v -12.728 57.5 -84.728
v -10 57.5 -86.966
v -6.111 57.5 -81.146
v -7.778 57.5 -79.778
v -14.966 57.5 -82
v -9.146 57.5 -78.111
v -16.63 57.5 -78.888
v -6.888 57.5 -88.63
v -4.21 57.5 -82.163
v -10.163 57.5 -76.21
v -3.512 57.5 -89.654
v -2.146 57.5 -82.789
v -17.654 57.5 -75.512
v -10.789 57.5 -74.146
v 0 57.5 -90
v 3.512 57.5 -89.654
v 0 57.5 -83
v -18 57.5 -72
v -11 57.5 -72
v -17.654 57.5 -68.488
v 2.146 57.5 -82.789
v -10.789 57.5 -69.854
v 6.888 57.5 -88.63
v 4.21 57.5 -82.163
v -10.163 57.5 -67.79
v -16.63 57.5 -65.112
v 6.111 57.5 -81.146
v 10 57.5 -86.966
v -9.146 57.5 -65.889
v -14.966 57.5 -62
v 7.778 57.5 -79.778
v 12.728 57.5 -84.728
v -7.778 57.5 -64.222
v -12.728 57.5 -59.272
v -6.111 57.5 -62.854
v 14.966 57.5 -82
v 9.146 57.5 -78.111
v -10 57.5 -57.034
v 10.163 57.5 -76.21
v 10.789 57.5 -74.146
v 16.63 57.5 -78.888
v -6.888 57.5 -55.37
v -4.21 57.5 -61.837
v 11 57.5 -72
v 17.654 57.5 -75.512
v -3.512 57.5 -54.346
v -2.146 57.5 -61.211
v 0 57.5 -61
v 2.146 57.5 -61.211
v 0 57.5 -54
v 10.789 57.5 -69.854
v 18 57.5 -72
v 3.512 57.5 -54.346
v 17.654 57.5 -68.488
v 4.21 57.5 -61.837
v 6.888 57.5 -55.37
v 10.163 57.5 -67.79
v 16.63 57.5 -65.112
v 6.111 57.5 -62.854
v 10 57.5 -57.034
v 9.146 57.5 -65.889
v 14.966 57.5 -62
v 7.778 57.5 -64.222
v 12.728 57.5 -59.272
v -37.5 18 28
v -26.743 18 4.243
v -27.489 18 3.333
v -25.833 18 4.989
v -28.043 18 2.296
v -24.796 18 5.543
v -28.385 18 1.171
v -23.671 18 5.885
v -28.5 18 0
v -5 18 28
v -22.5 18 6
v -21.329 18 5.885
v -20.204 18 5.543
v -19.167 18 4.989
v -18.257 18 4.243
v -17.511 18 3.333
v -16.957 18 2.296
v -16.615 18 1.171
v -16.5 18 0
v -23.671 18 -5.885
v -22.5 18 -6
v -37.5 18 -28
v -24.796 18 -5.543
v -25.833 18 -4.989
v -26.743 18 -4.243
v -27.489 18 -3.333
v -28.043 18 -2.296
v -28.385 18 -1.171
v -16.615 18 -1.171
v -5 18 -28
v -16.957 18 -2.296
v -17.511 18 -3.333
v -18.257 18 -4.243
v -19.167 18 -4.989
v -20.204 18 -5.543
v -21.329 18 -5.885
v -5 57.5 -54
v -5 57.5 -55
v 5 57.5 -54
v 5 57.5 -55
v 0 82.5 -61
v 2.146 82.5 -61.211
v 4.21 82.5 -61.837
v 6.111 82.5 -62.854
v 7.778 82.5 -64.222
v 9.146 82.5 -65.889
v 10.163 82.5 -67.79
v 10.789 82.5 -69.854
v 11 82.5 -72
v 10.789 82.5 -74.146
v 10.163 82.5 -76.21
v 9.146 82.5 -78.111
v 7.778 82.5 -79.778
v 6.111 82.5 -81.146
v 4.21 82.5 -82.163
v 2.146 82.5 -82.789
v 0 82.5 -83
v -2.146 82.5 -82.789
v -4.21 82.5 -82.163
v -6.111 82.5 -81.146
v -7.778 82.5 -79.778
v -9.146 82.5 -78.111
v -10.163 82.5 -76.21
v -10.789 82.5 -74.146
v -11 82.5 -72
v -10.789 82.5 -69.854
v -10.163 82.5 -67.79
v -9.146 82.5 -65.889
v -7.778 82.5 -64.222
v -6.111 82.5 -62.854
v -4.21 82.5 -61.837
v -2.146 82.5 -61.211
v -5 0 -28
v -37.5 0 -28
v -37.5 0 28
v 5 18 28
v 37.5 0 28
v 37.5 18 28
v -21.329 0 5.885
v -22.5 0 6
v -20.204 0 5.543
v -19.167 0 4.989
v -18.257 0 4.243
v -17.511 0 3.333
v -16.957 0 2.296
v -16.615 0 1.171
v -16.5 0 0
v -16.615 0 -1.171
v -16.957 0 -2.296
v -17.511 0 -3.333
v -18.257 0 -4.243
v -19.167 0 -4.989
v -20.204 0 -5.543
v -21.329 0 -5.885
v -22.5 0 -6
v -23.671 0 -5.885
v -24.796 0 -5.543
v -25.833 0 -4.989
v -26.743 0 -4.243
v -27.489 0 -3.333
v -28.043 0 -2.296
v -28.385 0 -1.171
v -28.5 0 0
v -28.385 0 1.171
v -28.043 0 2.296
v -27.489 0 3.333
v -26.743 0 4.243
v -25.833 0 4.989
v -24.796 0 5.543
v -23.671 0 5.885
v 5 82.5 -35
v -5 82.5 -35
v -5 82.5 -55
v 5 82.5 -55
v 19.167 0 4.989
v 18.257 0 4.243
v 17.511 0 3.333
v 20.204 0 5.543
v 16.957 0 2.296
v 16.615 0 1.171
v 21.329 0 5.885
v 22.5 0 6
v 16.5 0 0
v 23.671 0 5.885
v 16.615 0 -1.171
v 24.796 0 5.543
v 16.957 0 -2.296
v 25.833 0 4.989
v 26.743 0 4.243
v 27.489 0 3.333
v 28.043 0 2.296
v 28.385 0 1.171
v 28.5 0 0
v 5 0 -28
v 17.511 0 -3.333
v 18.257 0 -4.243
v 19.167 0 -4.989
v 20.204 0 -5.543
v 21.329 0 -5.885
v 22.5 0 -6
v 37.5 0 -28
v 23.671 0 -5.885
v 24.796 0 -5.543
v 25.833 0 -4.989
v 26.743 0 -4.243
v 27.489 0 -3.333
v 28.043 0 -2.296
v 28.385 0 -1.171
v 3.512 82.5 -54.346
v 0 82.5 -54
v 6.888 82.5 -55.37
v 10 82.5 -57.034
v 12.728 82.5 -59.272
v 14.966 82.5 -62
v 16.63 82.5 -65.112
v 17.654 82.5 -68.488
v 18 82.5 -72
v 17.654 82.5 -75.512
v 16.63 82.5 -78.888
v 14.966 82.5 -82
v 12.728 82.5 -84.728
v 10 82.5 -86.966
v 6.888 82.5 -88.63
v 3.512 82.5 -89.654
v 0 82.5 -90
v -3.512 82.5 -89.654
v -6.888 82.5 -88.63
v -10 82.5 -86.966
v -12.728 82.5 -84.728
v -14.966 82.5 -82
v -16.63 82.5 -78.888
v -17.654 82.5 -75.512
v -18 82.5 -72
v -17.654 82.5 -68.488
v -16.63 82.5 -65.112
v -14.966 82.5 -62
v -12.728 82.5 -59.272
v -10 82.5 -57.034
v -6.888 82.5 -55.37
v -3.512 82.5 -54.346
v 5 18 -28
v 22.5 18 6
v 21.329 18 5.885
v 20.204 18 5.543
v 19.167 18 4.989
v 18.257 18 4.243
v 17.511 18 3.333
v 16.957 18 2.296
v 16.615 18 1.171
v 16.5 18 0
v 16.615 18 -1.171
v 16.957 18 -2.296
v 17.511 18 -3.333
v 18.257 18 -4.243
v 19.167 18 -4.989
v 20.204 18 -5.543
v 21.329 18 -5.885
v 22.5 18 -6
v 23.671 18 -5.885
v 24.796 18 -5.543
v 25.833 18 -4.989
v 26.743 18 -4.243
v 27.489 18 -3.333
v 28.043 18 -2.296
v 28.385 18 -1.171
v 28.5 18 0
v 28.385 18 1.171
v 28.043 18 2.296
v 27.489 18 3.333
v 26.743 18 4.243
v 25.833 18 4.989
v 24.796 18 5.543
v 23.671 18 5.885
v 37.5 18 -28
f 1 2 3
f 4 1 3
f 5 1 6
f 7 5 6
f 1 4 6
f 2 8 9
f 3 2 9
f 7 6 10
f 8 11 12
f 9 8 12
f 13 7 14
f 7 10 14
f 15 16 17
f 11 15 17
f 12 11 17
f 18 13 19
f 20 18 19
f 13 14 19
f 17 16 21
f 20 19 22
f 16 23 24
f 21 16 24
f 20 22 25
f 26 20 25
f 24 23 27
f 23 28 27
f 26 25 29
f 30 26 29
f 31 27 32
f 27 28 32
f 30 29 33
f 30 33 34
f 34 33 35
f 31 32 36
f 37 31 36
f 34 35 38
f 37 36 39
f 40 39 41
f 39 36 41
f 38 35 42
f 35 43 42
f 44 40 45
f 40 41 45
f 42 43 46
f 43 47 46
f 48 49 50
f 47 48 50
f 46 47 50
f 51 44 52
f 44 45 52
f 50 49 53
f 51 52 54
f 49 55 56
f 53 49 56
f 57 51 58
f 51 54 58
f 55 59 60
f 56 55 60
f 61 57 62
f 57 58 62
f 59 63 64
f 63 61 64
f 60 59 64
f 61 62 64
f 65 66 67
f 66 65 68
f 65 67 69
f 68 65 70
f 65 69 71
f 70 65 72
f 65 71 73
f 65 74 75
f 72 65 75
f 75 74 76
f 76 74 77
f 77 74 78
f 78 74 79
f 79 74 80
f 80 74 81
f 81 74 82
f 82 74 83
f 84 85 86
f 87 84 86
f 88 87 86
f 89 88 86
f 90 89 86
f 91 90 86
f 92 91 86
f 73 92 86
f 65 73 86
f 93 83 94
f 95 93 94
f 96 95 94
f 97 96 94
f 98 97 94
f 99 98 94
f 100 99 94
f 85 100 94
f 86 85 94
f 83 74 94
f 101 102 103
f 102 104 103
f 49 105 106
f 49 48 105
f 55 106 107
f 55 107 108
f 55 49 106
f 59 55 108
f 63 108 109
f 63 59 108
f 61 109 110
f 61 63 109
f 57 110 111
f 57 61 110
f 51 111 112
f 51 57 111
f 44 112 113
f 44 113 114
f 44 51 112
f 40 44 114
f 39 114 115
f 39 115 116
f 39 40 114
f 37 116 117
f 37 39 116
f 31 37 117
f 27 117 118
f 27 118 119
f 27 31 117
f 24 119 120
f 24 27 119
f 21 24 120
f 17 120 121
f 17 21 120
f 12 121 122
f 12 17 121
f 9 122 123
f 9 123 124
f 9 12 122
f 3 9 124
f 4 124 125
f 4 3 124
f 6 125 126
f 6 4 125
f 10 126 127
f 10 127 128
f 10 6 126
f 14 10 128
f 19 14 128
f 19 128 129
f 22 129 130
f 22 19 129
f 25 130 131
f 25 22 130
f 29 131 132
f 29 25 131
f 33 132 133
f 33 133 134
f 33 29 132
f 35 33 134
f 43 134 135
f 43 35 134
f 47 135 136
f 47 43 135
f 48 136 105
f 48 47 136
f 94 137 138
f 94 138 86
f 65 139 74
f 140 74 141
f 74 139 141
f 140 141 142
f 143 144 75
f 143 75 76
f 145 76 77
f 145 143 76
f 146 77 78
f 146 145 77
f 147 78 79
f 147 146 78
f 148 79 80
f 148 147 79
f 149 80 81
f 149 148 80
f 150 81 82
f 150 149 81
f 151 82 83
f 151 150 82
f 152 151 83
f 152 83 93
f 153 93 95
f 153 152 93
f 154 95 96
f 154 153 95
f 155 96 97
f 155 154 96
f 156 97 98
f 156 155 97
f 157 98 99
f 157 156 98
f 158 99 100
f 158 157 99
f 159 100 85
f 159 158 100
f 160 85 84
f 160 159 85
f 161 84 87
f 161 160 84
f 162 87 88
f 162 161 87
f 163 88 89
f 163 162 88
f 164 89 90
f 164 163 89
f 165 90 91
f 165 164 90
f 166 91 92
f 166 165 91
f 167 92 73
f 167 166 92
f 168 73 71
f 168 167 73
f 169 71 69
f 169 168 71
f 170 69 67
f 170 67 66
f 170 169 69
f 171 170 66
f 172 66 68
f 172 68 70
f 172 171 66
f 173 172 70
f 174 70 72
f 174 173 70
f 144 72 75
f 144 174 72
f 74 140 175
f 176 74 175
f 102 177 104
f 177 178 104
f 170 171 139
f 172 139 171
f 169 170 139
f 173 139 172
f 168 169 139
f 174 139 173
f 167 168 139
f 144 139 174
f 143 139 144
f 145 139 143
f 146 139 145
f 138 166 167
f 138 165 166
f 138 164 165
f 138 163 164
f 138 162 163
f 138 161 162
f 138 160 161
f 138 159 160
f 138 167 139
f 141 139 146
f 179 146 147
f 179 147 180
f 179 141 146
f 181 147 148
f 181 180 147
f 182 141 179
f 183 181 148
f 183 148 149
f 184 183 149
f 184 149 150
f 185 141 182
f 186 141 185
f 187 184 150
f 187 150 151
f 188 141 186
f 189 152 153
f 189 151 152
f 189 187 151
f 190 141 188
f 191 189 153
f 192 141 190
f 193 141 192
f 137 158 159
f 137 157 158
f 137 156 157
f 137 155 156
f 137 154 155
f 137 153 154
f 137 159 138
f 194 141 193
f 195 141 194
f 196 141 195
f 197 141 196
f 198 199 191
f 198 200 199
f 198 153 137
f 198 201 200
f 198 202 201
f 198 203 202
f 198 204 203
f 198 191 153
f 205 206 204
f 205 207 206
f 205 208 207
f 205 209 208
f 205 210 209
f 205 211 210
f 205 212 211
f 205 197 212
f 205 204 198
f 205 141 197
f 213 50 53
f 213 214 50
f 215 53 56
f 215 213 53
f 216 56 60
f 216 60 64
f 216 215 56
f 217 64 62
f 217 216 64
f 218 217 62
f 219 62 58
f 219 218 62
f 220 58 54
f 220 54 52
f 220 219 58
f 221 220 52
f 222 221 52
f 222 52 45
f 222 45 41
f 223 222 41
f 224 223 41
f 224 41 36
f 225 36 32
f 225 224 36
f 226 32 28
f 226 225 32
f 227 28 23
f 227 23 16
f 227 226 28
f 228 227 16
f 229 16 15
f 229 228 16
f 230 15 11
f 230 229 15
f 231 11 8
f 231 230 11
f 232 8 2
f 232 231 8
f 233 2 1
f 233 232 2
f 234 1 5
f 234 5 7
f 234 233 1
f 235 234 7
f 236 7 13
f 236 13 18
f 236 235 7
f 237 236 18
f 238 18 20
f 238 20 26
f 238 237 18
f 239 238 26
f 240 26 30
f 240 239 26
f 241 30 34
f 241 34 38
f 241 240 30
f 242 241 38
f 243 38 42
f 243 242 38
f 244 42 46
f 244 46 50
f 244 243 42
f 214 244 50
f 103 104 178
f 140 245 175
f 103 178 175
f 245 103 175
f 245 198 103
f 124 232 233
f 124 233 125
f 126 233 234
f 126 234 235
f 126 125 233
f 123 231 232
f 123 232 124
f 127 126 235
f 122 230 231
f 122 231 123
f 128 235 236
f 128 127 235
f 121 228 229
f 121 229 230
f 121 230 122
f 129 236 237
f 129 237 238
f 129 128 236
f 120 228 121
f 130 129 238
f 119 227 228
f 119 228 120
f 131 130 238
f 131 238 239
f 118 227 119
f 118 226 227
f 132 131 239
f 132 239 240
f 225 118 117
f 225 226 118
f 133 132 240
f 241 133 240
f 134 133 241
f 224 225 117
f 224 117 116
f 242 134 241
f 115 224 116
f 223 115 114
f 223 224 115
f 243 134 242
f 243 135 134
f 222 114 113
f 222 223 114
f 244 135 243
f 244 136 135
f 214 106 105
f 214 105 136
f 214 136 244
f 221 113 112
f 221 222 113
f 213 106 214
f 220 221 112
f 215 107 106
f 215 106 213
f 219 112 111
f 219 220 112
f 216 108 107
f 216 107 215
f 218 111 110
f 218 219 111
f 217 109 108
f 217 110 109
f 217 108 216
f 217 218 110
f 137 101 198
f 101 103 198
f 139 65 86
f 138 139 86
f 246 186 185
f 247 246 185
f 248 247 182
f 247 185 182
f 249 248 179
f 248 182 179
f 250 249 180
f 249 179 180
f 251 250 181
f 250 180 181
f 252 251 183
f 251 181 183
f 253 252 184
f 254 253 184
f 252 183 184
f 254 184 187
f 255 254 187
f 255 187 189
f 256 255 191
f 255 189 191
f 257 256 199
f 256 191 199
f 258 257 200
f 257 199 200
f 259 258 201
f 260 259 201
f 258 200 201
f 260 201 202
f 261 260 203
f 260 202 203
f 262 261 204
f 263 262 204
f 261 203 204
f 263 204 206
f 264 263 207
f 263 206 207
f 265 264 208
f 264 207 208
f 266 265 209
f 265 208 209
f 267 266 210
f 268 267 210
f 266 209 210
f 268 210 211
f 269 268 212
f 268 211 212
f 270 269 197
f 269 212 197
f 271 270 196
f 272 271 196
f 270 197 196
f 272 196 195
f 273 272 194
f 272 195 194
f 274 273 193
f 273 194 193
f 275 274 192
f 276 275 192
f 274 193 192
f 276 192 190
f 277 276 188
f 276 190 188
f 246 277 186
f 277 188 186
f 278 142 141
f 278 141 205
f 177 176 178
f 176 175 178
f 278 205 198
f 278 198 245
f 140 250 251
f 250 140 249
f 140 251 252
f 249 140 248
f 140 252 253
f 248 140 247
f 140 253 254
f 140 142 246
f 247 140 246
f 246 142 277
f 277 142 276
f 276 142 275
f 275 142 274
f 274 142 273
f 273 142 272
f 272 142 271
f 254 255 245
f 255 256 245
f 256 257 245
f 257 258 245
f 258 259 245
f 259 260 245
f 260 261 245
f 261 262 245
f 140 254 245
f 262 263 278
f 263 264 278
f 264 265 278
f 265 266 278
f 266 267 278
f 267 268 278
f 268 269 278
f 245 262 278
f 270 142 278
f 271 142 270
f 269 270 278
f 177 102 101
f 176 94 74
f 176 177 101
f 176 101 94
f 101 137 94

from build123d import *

# Parameters (mm, degrees)
SKETCH1_W           = 56
SKETCH1_H           = 18
BOSS_EXTRUDE1_DEPTH = 37.5
SKETCH3_R           = 18
SKETCH3_R_2         = 11
BOSS_EXTRUDE2_DEPTH = 12.5
BOSS_EXTRUDE3_DEPTH = 5
SKETCH6_W           = 6
SKETCH6_H           = 18.001


with BuildPart() as part:
    # Sketch1 → Boss-Extrude1 (new, symmetric)
    with BuildSketch(Plane(origin=(0, 0, 0), x_dir=(0, 0, -1), z_dir=(1, 0, 0))):
        with Locations((0, 9)):
            Rectangle(SKETCH1_W, SKETCH1_H)
    extrude(amount=BOSS_EXTRUDE1_DEPTH, both=True)

    # Sketch4 → Boss-Extrude3 (add, symmetric)
    with BuildSketch(Plane(origin=(0, 0, 0), x_dir=(0, 0, -1), z_dir=(1, 0, 0))):
        Polygon((-28, 18), (35, 82.5), (55, 82.5), (55, 57.5), (54, 57.5), (28, 0), (28, 18), align=None)
    extrude(amount=BOSS_EXTRUDE3_DEPTH, both=True)

    # Sketch6 → Hole1 (revolve, cut)
    with BuildSketch(Plane(origin=(-22.5, 18, 0), x_dir=(0, 0, 1), z_dir=(1, 0, 0))):
        with Locations((3, 9.0005)):
            Rectangle(SKETCH6_W, SKETCH6_H)
    hole1 = revolve(axis=Axis((-22.5, -92, 0), (0, 1, 0)), mode=Mode.SUBTRACT)

    # Mirror1: Hole1 across plane
    add(hole1.mirror(Plane(origin=(0, 0, 0), x_dir=(0, 0, 1), z_dir=(1, 0, 0))), mode=Mode.SUBTRACT)


with BuildPart() as body_2:
    # Sketch3 → Boss-Extrude2 (new, symmetric)
    with BuildSketch(Plane(origin=(0, 70, 0), x_dir=(1, 0, 0), z_dir=(0, 1, 0))):
        with Locations(Location((0, 72, 0), (0, 0, 270))):
            Circle(SKETCH3_R)
        with Locations(Location((0, 72, 0), (0, 0, 270))):
            Circle(SKETCH3_R_2, mode=Mode.SUBTRACT)
    extrude(amount=BOSS_EXTRUDE2_DEPTH, both=True)


solid = Compound([part.part, body_2.part])
